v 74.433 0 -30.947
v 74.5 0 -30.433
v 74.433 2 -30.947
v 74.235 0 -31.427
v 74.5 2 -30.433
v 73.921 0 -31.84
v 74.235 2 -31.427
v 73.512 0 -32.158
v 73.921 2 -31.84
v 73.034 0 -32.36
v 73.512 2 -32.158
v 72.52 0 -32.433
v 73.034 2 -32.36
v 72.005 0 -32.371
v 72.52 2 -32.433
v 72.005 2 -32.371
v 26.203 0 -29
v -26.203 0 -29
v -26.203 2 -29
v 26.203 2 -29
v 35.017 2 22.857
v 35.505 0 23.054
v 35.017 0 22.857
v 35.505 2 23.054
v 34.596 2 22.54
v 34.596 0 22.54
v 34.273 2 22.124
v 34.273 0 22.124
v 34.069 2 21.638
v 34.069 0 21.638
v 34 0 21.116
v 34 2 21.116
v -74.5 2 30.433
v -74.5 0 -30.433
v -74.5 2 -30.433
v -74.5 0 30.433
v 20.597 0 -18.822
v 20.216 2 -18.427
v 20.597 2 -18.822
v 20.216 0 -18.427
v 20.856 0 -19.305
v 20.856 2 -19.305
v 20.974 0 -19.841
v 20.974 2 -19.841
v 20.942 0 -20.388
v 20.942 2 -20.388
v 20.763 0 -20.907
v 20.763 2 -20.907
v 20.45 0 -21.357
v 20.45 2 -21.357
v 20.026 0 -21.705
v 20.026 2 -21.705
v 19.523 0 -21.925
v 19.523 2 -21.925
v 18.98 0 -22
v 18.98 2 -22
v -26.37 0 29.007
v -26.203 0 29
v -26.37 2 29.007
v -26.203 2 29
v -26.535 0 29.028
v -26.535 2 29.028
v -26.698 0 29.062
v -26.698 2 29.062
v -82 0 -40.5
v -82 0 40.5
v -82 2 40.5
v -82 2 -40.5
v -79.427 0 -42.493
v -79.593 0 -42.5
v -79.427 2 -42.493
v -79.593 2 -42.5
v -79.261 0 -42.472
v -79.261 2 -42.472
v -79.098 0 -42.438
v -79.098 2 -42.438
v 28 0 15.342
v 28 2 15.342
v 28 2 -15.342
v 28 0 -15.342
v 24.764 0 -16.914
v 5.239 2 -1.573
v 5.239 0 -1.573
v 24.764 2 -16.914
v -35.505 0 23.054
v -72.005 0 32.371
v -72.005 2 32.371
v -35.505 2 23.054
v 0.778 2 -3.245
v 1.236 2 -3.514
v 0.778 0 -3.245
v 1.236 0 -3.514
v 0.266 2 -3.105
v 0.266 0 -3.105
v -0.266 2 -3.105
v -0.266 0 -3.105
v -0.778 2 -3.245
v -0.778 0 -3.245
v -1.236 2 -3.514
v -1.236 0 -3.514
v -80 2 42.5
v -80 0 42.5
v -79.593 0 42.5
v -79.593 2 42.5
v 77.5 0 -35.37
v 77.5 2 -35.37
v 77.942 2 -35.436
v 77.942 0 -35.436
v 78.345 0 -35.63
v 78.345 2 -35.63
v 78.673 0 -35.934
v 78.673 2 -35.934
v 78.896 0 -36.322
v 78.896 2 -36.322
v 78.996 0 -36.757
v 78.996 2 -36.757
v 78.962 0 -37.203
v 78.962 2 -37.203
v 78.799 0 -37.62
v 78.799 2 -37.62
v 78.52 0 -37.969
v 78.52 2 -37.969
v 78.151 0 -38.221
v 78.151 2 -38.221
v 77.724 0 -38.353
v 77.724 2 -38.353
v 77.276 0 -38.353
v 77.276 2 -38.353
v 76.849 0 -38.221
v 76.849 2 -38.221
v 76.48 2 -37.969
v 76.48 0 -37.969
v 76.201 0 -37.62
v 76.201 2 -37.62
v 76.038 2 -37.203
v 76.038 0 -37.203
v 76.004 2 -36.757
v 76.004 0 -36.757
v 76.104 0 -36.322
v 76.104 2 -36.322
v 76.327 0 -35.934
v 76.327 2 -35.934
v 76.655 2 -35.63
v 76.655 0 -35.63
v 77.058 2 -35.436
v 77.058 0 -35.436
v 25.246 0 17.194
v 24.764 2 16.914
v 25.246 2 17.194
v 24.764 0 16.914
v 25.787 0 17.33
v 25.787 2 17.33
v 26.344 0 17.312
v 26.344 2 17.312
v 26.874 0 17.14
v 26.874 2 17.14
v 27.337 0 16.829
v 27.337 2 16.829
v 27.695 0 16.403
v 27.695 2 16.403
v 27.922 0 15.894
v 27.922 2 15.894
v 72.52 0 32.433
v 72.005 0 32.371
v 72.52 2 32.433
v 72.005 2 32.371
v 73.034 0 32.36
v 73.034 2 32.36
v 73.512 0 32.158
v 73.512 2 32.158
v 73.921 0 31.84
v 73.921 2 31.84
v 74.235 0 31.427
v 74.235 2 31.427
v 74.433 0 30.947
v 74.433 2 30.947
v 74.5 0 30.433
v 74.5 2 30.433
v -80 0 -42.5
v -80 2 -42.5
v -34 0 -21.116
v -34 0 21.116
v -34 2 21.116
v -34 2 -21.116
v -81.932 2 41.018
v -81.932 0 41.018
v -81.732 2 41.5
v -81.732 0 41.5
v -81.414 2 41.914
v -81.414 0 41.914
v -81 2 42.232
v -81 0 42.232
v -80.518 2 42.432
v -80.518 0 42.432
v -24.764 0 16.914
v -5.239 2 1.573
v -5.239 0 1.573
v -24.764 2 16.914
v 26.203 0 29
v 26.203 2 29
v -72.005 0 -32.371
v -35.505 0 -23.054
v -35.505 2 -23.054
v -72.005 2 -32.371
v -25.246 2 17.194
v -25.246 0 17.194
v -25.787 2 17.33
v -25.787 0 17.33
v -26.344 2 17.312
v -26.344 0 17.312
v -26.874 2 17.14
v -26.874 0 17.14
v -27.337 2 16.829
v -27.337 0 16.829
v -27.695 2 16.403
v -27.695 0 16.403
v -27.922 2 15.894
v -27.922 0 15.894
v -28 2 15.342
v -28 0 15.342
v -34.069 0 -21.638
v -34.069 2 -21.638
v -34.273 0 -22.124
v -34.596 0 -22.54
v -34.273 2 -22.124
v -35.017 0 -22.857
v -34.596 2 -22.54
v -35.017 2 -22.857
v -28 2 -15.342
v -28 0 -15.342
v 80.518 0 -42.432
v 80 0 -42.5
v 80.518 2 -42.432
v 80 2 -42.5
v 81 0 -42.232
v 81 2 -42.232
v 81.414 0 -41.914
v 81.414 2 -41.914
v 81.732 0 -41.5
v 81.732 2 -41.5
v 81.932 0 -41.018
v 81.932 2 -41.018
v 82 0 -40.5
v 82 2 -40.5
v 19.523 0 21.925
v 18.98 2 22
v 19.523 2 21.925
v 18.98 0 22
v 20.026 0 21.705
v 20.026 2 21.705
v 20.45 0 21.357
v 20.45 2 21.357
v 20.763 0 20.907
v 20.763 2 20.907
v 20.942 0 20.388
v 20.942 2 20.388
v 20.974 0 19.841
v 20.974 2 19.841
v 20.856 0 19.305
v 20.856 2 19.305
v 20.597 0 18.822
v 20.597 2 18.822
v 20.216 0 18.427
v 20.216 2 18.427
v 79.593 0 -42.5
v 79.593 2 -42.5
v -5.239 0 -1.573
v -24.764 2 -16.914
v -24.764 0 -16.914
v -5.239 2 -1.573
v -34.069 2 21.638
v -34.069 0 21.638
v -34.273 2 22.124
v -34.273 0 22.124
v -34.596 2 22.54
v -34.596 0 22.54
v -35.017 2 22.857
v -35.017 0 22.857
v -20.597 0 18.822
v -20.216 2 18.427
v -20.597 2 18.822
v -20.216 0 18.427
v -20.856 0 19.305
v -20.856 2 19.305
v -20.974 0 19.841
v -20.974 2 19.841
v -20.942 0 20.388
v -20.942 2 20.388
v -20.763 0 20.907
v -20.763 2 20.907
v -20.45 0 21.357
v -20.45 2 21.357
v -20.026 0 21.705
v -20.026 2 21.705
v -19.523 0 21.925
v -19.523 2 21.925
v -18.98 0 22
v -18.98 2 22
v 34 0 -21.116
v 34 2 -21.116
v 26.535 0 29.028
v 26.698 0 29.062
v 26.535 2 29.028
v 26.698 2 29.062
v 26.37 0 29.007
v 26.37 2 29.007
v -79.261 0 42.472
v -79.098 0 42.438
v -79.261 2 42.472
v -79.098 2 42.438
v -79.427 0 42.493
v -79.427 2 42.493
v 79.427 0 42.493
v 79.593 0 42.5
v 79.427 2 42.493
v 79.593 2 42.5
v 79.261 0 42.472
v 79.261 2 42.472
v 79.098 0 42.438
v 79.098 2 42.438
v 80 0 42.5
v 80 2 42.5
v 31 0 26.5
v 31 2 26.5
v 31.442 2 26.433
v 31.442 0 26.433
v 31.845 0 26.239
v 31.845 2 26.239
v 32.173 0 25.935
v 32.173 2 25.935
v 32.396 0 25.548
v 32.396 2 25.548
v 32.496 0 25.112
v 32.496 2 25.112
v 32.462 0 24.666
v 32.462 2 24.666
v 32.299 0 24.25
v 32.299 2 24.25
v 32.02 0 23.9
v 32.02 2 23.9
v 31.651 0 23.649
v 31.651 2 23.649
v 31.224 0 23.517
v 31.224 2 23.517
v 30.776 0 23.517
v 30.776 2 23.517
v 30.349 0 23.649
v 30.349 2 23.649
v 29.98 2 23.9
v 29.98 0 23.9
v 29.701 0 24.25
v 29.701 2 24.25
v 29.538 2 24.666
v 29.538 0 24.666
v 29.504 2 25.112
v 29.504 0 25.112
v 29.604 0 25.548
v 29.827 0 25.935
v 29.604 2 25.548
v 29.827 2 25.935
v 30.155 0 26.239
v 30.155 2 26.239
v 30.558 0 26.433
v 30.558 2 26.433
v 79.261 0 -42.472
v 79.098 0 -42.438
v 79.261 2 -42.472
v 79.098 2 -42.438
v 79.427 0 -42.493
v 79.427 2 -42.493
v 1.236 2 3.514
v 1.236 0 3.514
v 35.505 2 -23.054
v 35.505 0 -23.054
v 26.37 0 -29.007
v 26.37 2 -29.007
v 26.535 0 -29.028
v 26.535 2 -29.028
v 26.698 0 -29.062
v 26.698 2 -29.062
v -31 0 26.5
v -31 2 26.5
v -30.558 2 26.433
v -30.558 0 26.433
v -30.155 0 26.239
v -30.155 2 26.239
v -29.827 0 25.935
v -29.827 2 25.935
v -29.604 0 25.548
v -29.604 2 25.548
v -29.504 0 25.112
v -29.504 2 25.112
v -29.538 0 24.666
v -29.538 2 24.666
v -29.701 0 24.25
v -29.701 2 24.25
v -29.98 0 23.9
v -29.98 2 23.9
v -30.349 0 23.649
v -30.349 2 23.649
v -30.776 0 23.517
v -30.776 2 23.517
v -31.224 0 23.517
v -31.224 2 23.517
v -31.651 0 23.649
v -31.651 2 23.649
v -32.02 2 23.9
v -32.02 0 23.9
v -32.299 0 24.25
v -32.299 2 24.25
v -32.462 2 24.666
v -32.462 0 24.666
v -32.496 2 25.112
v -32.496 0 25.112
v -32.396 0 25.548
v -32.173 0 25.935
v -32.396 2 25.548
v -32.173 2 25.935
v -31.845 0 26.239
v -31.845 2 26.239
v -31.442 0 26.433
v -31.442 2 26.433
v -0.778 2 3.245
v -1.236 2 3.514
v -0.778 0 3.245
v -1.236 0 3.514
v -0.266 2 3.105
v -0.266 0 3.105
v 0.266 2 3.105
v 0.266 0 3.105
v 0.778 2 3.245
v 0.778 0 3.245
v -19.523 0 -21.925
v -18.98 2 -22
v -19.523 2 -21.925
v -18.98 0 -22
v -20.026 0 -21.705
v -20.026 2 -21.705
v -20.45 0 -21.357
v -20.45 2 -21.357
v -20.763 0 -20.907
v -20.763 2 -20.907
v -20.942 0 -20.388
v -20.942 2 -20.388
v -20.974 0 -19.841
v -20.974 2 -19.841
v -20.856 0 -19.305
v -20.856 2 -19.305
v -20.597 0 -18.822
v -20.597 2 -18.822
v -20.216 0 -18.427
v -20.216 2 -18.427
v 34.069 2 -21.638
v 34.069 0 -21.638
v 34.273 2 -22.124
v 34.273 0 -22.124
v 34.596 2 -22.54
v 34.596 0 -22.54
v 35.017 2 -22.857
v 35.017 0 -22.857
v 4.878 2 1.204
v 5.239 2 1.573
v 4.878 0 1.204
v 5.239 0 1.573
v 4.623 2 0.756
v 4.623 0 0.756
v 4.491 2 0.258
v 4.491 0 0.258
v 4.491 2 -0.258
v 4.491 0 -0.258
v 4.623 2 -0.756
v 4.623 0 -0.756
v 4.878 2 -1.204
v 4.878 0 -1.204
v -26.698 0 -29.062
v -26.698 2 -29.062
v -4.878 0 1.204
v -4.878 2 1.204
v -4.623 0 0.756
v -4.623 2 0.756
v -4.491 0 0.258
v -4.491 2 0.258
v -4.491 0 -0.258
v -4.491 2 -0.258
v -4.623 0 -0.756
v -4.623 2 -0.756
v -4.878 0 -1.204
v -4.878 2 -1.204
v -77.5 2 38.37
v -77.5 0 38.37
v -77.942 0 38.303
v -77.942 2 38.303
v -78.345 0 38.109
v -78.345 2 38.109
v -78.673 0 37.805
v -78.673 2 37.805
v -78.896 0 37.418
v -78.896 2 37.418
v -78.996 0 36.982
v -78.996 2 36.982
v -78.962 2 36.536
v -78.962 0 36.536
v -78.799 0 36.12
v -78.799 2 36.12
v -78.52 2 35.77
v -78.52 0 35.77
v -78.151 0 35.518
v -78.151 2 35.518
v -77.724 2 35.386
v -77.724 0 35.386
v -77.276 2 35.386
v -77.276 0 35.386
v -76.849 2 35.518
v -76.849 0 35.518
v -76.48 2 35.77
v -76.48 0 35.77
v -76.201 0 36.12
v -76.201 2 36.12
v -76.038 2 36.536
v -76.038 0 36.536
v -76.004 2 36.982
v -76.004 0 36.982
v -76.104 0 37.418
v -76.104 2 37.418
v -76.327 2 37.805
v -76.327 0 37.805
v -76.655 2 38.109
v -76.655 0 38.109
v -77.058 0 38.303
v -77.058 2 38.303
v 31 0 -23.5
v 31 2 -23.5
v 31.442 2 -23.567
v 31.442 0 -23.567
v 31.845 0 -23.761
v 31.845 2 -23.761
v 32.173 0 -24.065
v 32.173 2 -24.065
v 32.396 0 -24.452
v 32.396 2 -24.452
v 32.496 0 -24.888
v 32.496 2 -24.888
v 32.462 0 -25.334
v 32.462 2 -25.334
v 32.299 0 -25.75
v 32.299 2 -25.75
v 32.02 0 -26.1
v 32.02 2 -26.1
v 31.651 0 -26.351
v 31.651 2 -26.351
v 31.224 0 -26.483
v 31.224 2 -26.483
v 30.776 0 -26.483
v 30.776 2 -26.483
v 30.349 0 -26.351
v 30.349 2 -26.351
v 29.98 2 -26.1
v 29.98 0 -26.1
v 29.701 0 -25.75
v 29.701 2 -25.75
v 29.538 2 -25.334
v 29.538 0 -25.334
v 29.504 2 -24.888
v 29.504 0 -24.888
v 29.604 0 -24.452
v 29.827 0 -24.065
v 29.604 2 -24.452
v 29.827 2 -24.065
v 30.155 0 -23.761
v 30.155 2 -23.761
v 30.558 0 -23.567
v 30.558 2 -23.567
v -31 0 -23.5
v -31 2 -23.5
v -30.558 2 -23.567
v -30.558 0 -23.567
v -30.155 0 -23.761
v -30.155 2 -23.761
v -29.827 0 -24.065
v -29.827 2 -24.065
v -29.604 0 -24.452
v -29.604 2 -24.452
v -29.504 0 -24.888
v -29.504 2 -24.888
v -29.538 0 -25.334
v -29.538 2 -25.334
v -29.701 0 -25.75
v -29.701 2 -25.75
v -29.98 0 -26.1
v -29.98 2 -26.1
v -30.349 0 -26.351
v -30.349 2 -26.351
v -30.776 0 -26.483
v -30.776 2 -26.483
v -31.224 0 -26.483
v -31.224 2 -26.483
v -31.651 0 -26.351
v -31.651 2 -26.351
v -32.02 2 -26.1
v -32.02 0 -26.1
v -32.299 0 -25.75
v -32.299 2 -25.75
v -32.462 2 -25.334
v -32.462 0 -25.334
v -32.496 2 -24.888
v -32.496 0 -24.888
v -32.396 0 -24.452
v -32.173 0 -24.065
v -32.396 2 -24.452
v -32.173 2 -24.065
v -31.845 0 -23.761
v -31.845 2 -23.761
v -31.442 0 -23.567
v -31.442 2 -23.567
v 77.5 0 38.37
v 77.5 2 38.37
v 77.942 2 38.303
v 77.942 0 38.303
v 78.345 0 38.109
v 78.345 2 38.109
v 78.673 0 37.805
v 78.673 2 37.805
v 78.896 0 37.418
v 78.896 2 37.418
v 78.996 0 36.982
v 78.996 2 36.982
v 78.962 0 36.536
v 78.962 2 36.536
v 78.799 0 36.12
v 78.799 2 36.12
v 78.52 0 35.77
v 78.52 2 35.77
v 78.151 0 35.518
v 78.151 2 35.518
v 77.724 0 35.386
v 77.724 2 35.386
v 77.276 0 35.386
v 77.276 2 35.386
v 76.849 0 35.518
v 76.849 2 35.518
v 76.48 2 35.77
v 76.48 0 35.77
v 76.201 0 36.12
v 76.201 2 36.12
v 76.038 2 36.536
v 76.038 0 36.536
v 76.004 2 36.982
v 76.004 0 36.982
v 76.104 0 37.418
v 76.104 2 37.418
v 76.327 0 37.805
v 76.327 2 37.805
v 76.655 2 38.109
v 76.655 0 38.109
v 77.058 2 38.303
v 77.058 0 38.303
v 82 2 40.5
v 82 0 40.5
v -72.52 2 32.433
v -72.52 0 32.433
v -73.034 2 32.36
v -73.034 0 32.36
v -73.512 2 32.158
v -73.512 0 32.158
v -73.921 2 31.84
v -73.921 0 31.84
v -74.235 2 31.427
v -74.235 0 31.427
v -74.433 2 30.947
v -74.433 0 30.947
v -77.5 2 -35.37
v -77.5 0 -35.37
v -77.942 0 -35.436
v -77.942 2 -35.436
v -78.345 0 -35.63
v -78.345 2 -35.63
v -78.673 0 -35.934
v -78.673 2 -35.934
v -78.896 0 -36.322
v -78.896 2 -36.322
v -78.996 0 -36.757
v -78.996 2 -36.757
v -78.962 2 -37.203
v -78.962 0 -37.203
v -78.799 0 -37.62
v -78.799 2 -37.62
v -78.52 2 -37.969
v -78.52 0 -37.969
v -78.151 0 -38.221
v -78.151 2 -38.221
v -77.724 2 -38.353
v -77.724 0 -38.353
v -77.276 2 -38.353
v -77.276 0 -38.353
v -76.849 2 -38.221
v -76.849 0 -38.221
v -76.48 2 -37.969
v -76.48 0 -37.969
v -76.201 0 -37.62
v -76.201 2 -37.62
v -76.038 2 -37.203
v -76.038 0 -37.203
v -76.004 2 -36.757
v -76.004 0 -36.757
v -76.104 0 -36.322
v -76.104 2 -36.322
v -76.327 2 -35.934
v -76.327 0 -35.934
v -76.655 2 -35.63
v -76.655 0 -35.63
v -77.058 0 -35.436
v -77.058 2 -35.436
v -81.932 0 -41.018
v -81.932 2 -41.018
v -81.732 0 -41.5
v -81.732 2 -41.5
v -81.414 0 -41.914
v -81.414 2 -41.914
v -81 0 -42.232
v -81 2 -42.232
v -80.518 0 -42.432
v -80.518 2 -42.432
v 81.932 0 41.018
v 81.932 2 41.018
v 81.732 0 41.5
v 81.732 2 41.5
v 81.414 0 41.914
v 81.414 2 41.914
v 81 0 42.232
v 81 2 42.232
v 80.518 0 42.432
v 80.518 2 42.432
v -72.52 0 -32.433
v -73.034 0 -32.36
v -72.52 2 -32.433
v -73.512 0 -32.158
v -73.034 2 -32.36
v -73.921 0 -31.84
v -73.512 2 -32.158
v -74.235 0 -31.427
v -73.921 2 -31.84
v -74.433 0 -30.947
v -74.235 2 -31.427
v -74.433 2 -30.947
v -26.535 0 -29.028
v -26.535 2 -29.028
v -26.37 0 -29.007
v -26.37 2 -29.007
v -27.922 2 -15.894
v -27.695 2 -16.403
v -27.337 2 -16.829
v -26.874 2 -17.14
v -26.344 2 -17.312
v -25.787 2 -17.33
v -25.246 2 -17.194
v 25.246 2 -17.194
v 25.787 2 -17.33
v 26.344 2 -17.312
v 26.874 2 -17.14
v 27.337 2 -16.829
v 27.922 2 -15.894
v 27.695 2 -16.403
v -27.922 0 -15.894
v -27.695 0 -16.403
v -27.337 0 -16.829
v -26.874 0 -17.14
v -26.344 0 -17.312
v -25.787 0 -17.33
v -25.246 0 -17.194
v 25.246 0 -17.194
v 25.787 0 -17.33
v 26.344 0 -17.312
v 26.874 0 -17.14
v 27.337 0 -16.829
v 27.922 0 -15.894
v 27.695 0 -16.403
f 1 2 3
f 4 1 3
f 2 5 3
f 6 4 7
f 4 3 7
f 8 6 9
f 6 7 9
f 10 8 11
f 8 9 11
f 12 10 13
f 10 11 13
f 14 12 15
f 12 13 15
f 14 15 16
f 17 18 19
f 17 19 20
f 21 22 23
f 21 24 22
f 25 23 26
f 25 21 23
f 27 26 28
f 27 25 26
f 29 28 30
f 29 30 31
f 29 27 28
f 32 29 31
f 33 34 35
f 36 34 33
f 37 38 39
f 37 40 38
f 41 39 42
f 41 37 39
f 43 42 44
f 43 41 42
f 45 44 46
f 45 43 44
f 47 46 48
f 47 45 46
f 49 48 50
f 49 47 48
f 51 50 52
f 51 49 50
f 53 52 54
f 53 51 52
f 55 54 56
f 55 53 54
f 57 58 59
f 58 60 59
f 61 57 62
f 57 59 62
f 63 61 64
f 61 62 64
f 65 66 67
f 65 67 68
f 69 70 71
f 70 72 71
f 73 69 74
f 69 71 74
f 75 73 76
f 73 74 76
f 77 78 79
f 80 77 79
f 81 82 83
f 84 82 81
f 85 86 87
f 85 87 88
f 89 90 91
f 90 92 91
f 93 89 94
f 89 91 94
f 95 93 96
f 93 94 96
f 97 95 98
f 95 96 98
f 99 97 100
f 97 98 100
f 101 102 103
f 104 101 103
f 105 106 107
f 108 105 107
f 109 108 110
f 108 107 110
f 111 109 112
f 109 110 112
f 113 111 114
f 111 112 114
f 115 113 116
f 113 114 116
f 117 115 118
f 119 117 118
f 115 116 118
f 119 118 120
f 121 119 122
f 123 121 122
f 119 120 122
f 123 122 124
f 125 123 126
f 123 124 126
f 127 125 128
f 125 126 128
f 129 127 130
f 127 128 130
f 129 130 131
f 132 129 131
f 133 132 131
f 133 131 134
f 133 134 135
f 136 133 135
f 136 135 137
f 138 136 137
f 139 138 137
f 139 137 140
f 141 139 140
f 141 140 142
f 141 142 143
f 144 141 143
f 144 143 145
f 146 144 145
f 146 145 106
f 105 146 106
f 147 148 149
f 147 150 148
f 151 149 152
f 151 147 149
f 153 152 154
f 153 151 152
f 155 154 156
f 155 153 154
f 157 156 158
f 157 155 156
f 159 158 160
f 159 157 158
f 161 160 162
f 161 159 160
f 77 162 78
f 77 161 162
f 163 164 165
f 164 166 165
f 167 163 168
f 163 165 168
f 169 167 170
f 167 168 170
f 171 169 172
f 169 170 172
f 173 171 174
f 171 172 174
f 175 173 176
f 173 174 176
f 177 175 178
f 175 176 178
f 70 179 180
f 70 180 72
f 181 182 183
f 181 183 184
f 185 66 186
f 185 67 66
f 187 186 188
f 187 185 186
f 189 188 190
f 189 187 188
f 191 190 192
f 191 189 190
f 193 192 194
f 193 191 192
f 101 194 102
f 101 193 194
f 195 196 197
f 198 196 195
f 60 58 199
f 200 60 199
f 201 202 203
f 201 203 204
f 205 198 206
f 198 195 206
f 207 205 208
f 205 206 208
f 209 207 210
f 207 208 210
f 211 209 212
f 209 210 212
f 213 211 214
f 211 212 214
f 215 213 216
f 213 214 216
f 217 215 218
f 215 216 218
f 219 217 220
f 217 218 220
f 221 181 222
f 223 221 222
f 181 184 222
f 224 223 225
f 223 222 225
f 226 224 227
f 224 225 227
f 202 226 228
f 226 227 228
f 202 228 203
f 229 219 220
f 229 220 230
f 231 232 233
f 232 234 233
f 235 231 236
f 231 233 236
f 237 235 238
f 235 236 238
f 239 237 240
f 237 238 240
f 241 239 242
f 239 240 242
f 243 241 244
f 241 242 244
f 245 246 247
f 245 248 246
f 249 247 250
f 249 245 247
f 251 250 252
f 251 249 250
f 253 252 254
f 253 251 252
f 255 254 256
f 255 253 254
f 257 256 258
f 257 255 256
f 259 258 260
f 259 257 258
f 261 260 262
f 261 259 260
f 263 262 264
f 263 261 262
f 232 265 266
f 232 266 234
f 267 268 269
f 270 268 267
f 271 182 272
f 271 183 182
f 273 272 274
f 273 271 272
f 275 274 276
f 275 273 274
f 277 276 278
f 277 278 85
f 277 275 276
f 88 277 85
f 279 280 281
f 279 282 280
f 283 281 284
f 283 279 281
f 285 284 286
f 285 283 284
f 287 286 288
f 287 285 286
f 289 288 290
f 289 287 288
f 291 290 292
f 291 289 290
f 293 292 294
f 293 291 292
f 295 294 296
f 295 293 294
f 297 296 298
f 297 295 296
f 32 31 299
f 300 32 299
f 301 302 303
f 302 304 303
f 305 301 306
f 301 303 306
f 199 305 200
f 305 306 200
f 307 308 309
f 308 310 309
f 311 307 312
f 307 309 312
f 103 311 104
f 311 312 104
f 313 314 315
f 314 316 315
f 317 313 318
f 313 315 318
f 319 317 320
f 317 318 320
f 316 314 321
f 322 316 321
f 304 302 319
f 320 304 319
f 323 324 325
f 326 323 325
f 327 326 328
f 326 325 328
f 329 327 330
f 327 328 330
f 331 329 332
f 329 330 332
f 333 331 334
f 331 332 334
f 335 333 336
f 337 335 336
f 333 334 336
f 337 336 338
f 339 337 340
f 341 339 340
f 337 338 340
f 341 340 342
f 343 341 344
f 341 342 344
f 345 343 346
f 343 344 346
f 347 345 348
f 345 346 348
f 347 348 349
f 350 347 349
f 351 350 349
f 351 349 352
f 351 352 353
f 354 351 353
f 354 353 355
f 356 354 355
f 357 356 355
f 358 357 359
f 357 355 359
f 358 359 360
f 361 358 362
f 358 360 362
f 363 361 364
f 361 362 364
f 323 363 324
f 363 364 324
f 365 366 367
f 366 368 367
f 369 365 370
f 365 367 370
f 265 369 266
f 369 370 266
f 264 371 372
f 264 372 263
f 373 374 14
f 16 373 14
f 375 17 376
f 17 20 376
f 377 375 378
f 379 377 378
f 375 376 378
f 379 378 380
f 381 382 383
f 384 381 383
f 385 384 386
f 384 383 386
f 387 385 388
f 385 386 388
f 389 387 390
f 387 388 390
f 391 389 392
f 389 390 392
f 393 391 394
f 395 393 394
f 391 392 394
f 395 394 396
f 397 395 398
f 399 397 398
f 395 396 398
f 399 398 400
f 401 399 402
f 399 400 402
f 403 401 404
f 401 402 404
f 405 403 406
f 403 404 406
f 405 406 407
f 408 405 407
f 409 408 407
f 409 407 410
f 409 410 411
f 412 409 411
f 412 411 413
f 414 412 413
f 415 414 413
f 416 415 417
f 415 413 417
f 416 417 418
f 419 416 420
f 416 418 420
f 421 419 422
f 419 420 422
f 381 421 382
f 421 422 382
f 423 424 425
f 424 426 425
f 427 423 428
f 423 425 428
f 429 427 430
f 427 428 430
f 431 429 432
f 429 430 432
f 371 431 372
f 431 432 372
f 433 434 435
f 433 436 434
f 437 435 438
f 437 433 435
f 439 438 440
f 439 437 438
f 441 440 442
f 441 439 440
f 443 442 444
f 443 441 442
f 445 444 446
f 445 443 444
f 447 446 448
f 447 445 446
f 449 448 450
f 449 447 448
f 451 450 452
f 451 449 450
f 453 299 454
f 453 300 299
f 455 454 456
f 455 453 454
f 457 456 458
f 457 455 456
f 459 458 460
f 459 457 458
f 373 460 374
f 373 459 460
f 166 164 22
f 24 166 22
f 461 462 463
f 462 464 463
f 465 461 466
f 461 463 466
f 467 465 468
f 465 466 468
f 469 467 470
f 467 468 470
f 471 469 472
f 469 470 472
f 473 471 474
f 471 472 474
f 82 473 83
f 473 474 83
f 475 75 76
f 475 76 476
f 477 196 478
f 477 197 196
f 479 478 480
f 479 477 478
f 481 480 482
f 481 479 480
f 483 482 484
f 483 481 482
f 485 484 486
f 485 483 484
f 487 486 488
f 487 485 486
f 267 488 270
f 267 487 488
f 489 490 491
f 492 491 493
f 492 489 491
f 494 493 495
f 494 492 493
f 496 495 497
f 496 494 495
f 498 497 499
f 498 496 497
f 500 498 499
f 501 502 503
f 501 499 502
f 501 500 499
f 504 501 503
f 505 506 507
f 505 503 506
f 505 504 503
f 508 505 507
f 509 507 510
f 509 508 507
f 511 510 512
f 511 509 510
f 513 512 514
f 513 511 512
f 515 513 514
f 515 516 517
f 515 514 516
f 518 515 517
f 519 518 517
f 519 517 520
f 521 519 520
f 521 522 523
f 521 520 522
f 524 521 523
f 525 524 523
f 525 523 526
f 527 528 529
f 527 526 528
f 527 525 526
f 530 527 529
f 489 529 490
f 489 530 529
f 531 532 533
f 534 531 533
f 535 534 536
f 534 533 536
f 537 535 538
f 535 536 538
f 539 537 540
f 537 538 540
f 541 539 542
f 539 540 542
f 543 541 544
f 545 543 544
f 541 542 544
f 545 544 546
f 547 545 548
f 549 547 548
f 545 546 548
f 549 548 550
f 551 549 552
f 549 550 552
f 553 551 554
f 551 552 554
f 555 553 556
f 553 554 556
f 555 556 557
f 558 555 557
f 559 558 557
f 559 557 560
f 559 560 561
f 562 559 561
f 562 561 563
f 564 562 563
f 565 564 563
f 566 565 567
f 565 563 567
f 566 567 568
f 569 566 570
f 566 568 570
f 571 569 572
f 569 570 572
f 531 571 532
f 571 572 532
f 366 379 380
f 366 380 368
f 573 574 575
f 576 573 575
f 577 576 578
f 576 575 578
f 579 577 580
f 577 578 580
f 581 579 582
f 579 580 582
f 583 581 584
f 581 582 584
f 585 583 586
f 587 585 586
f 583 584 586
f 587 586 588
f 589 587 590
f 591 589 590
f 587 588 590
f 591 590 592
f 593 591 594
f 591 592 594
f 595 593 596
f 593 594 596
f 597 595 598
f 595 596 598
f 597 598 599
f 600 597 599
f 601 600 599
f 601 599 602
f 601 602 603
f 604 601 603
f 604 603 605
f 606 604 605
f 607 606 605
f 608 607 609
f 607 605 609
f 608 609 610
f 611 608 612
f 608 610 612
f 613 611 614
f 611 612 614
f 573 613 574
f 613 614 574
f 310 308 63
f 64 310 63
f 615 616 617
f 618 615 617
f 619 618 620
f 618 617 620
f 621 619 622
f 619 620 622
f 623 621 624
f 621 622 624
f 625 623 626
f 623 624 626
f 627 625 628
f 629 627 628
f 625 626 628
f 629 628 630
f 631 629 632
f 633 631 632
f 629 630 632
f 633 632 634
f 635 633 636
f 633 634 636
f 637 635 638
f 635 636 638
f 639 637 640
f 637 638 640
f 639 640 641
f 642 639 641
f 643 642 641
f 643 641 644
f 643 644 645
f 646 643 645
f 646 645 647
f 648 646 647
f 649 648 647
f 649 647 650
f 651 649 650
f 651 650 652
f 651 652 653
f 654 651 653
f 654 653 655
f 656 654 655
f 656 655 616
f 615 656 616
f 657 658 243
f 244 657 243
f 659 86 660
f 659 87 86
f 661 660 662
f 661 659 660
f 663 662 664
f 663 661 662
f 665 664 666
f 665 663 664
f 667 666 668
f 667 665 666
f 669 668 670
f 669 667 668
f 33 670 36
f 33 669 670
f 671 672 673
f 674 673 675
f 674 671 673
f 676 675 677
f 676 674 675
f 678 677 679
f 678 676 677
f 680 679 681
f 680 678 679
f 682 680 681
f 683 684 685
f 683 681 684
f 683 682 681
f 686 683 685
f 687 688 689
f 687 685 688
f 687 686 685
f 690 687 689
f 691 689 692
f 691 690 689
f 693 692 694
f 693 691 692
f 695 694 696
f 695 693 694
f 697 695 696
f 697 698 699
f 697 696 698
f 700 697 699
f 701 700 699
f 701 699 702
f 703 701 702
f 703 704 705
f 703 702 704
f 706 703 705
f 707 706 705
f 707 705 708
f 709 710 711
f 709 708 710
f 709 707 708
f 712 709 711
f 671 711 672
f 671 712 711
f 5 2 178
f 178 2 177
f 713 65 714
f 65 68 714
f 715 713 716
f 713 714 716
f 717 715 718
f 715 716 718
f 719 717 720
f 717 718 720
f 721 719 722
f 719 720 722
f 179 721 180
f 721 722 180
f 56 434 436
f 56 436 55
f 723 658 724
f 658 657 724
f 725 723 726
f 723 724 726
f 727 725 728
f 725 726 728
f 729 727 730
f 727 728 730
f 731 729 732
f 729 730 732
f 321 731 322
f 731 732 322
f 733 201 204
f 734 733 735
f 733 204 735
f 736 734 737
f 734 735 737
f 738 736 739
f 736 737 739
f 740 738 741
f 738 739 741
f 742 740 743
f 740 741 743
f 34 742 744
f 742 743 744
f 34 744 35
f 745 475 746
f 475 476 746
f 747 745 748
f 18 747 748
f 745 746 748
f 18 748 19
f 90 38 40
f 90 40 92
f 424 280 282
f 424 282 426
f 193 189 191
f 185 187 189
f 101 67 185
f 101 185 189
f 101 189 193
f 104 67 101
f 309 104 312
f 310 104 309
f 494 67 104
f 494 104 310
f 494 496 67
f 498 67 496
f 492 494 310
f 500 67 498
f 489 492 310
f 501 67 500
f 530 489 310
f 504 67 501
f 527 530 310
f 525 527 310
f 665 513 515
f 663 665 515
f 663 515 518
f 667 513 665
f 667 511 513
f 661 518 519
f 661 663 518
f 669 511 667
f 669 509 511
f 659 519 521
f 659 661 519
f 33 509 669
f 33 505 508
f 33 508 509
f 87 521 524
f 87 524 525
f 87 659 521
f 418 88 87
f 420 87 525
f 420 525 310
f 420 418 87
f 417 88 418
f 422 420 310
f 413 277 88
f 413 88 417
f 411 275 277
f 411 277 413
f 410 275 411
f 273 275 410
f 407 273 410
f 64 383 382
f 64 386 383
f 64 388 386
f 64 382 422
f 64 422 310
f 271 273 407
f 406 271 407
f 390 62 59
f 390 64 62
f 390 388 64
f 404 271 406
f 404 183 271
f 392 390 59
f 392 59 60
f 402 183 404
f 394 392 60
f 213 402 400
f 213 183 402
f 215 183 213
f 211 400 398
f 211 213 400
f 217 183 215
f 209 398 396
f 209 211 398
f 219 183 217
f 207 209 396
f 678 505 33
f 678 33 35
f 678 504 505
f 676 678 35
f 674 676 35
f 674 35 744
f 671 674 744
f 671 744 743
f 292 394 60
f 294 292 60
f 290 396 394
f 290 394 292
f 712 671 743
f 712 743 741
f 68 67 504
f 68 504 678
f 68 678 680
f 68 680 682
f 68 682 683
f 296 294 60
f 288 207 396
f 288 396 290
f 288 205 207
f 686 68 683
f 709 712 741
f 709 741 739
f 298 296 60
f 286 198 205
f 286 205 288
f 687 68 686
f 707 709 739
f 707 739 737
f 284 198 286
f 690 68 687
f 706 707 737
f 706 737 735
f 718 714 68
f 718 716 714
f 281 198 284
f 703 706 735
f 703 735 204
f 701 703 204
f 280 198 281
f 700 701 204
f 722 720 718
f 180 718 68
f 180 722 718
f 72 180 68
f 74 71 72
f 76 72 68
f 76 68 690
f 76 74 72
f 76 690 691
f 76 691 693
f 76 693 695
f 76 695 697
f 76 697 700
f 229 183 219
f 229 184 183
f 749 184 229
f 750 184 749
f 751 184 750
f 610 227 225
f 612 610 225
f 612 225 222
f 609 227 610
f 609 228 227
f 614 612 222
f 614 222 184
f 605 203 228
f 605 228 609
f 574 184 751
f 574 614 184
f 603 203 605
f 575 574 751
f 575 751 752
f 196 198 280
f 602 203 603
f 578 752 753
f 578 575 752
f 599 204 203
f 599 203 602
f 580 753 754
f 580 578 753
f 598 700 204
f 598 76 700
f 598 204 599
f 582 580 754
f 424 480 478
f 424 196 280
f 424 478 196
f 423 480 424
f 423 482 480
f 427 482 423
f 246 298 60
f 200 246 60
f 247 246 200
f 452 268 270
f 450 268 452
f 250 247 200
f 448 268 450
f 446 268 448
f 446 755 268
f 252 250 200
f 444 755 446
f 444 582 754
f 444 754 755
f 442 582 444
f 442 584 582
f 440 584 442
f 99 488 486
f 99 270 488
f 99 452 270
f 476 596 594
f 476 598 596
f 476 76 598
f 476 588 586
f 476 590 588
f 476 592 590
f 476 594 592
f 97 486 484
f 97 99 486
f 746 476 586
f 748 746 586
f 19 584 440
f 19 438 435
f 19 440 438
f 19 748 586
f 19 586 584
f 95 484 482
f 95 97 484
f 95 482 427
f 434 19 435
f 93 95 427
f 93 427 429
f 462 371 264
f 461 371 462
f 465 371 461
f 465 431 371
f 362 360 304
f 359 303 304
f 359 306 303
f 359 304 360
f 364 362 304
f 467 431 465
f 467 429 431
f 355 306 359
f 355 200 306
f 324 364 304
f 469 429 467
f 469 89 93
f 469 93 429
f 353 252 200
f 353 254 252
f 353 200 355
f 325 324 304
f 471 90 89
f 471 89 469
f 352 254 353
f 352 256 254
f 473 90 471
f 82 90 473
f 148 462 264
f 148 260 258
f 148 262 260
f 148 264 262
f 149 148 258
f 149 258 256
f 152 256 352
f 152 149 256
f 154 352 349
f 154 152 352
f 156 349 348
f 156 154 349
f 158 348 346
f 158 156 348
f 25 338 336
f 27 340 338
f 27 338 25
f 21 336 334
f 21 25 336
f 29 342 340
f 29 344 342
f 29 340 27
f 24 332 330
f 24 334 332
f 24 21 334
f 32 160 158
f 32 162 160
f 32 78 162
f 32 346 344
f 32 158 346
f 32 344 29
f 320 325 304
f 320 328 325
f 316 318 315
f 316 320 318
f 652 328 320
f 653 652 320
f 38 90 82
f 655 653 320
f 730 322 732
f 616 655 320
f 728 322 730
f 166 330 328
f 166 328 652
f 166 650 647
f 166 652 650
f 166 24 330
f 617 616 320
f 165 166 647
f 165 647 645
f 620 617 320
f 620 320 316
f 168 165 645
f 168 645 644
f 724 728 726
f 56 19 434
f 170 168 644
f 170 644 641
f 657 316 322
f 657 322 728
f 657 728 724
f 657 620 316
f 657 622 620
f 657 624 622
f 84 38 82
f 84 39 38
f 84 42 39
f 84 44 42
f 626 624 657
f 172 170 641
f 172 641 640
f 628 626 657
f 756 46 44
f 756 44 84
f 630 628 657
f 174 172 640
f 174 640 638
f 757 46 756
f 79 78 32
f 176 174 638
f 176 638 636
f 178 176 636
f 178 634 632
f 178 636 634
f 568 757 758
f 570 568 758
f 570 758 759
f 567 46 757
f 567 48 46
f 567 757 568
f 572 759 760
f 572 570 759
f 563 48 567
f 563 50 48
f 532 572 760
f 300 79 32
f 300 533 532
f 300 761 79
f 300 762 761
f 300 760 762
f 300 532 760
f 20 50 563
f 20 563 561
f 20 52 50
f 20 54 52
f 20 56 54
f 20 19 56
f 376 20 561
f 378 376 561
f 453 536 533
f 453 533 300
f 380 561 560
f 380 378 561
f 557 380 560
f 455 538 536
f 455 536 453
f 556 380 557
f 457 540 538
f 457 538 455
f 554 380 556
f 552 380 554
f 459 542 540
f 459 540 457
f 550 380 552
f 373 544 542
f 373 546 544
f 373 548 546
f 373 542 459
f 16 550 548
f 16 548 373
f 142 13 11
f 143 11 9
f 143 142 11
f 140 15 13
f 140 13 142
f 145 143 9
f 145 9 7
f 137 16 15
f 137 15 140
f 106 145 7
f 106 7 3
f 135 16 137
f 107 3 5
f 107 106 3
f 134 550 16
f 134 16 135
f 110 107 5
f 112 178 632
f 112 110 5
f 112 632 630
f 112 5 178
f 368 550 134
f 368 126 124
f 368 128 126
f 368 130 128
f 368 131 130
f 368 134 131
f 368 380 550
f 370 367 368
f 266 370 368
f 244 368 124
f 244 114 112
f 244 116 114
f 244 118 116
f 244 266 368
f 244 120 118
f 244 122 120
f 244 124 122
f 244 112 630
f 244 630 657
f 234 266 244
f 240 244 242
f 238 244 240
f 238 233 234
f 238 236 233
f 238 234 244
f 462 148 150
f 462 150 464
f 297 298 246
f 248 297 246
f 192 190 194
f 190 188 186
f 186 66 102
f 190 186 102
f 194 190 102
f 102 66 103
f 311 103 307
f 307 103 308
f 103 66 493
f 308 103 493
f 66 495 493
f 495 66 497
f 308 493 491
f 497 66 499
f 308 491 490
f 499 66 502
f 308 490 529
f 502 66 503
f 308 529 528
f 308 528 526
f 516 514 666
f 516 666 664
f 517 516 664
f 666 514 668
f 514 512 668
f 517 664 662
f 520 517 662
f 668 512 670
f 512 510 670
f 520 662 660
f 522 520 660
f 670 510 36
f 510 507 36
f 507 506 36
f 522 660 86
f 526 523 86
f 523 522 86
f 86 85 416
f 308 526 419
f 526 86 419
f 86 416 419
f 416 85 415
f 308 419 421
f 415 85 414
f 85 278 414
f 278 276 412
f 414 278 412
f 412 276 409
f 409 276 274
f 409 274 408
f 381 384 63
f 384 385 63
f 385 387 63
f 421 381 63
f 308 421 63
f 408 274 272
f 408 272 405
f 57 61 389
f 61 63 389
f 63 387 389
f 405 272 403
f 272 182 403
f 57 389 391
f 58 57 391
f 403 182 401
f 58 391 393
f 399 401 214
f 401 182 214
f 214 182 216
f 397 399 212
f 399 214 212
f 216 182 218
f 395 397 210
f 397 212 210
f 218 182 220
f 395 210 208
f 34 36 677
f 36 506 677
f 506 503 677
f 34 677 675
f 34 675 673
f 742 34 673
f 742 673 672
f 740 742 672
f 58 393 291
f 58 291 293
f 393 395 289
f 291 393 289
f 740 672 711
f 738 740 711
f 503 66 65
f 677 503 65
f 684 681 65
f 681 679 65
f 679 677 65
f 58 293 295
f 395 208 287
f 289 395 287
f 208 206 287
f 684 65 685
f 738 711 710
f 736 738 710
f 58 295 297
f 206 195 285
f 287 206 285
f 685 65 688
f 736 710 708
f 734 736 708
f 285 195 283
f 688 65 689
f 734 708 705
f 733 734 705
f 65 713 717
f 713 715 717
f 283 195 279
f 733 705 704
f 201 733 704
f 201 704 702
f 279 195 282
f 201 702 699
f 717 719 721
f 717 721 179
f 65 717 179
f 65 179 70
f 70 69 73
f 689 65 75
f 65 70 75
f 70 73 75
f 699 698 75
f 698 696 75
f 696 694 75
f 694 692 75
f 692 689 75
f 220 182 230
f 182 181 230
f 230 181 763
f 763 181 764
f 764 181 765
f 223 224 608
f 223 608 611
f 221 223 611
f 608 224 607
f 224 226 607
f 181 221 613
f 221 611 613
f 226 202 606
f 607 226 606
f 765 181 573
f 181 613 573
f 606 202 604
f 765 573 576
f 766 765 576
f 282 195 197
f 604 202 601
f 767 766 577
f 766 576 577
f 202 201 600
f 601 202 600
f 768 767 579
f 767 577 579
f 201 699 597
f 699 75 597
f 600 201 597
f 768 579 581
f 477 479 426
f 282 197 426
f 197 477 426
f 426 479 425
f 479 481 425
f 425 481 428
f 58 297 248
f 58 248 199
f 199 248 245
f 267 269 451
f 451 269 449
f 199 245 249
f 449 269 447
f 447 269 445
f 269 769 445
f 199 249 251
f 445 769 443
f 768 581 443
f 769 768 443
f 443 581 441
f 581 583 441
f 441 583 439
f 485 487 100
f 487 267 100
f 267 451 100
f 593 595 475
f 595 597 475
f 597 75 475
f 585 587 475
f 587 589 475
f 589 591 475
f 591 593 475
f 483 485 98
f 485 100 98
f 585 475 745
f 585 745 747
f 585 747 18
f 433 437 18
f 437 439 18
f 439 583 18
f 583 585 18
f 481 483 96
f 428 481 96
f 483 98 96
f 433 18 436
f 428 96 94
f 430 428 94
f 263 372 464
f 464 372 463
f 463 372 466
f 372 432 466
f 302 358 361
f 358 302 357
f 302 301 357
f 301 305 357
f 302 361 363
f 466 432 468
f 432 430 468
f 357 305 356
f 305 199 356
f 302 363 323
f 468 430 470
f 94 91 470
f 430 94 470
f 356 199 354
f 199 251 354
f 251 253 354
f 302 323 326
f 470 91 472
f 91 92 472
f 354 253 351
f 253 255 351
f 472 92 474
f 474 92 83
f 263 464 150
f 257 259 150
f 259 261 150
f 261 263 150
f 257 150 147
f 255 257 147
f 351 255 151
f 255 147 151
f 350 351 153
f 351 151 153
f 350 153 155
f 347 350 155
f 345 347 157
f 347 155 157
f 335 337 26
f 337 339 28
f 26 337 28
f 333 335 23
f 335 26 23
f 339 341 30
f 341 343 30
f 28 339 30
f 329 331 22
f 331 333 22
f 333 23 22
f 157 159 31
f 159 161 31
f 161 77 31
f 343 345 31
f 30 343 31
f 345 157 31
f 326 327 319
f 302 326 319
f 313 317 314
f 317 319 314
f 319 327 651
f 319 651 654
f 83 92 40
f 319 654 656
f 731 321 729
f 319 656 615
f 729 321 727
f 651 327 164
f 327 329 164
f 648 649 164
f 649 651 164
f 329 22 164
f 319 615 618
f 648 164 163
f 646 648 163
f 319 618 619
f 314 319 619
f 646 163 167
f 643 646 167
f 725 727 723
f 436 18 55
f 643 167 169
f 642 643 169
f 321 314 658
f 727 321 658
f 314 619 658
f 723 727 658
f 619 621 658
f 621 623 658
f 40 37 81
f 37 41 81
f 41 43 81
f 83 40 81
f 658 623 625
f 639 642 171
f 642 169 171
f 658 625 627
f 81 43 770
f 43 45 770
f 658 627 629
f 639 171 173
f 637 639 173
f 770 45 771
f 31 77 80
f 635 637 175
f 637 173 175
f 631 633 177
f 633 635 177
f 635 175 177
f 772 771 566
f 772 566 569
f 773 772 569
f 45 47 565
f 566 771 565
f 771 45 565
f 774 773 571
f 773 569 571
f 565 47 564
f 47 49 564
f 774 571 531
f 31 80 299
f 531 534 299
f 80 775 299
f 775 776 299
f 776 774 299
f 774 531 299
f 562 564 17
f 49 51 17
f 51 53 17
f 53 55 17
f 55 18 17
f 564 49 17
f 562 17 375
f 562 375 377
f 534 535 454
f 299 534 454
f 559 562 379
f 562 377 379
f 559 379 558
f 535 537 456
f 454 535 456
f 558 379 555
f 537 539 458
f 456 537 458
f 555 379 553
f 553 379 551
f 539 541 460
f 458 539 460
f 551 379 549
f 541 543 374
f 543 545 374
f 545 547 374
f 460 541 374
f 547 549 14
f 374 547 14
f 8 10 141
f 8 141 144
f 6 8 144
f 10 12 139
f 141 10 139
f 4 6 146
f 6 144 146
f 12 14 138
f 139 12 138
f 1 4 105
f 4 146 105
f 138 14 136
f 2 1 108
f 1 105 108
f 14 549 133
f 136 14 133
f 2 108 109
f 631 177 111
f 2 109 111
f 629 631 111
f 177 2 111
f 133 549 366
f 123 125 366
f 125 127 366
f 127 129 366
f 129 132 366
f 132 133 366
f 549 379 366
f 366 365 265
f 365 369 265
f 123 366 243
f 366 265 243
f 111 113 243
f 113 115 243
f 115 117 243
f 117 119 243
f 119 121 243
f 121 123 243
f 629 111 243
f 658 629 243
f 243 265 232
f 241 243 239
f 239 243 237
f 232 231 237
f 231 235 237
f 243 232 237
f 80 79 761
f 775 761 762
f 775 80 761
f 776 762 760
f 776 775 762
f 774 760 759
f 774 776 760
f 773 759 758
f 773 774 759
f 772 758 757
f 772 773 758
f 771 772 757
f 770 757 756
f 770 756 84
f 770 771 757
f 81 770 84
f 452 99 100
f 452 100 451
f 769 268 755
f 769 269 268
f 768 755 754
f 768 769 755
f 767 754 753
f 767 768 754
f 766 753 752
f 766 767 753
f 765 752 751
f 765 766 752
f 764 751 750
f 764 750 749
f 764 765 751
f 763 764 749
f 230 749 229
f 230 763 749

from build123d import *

# Parameters (mm, degrees)
SKETCH_1_W          = 164
SKETCH_1_H          = 85
EXTRUDE_1_DEPTH     = 2
SKETCH_2_R          = 1.5
CUT_EXTRUDE_1_DEPTH = 2
SKETCH_4_W          = 56
SKETCH_4_H          = 44
CUT_EXTRUDE_3_DEPTH = 10
EXTRUDE_2_DEPTH     = 2
SKETCH_9_R          = 1.5
CUT_EXTRUDE_6_DEPTH = 10
CUT_EXTRUDE_7_DEPTH = 10
CUT_EXTRUDE_8_DEPTH = 10
FILLET_3_R          = 2
FILLET_4_R          = 2


with BuildPart() as part:
    # 草图1 → 凸台-拉伸1 (new body)
    with BuildSketch(Plane(origin=(0, 0, 0), x_dir=(1, 0, 0), z_dir=(0, 1, 0))):
        Rectangle(SKETCH_1_W, SKETCH_1_H)
    extrude(amount=EXTRUDE_1_DEPTH)

    # 草图2 → 切除-拉伸1 (cut)
    with BuildSketch(Plane(origin=(0, 2, 0), x_dir=(1, 0, 0), z_dir=(0, 1, 0))):
        with Locations(Location((31, 25, 0), (0, 0, 270))):
            Circle(SKETCH_2_R)
        with Locations(Location((-31, 25, 0), (0, 0, 270))):
            Circle(SKETCH_2_R)
        with Locations(Location((-31, -25, 0), (0, 0, 270))):
            Circle(SKETCH_2_R)
        with Locations(Location((31, -25, 0), (0, 0, 270))):
            Circle(SKETCH_2_R)
    extrude(amount=-CUT_EXTRUDE_1_DEPTH, mode=Mode.SUBTRACT)

    # 草图4 → 切除-拉伸3 (cut)
    with BuildSketch(Plane(origin=(0, 2, 0), x_dir=(1, 0, 0), z_dir=(0, 1, 0))):
        Rectangle(SKETCH_4_W, SKETCH_4_H)
    extrude(amount=-CUT_EXTRUDE_3_DEPTH, mode=Mode.SUBTRACT)

    # 草图7 → 凸台-拉伸2 (add)
    with BuildSketch(Plane(origin=(0, 2, 0), x_dir=(1, 0, 0), z_dir=(0, 1, 0))):
        Polygon((0, -2.543499116), (-3.237180694, 0), (-28, -19.456500884), (-28, -22), (-24.762819306, -22), align=None)
        Polygon((0, 2.543499116), (-3.237180694, 0), (0, -2.543499116), (3.237180694, 0), align=None)
        Polygon((24.762819306, 22), (0, 2.543499116), (3.237180694, 0), (28, 19.456500884), (28, 22), align=None)
        Polygon((3.237180694, 0), (0, -2.543499116), (24.762819306, -22), (28, -22), (28, -19.456500884), align=None)
        Polygon((-28, 22), (-28, 19.456500884), (-3.237180694, 0), (0, 2.543499116), (-24.762819306, 22), align=None)
    extrude(amount=-EXTRUDE_2_DEPTH)

    # 草图9 → 切除-拉伸6 (cut)
    with BuildSketch(Plane(origin=(0, 2, 0), x_dir=(1, 0, 0), z_dir=(0, 1, 0))):
        with Locations(Location((77.5, -36.869534675, 0), (0, 0, 270))):
            Circle(SKETCH_9_R)
        with Locations(Location((77.5, 36.869534675, 0), (0, 0, 270))):
            Circle(SKETCH_9_R)
    cut_extrude_6 = extrude(amount=-CUT_EXTRUDE_6_DEPTH, mode=Mode.SUBTRACT)

    # 镜向3: 切除-拉伸6 across plane
    add(cut_extrude_6.mirror(Plane(origin=(0, 0, 0), x_dir=(0, 0, 1), z_dir=(1, 0, 0))), mode=Mode.SUBTRACT)

    # 草图11 → 切除-拉伸7 (cut)
    with BuildSketch(Plane.XZ):
        Polygon((-74.5, 33.007564849), (-34, 22.669583035), (-34, -22.669583035), (-74.5, -33.007564849), align=None)
    cut_extrude_7 = extrude(amount=-CUT_EXTRUDE_7_DEPTH, mode=Mode.SUBTRACT)

    # 镜向4: 切除-拉伸7 across plane
    add(cut_extrude_7.mirror(Plane(origin=(0, 0, 0), x_dir=(0, 0, 1), z_dir=(1, 0, 0))), mode=Mode.SUBTRACT)

    # 草图12 → 切除-拉伸8 (cut)
    with BuildSketch(Plane.XZ):
        Polygon((-79.341828688, 42.5), (-26.454329961, 29), (26.454329961, 29), (79.341828688, 42.5), align=None)
    cut_extrude_8 = extrude(amount=-CUT_EXTRUDE_8_DEPTH, mode=Mode.SUBTRACT)

    # 镜向5: 切除-拉伸8 across plane
    add(cut_extrude_8.mirror(Plane.XY), mode=Mode.SUBTRACT)

    # 圆角3
    fillet_3_edges = [part.edges().sort_by_distance(p)[0] for p in [
        (-74.5, 1, -33.007564849),
        (-74.5, 1, 33.007564849),
        (-34, 1, 22.669583035),
        (-34, 1, -22.669583035),
        (74.5, 1, 33.007564849),
        (74.5, 1, -33.007564849),
        (34, 1, -22.669583035),
        (34, 1, 22.669583035),
        (-28, 1, 19.456500884),
        (-3.237180694, 1, 0),
        (-28, 1, -19.456500884),
        (-24.762819306, 1, -22),
        (0, 1, -2.543499116),
        (24.762819306, 1, -22),
        (28, 1, -19.456500884),
        (3.237180694, 1, 0),
        (28, 1, 19.456500884),
        (24.762819306, 1, 22),
        (0, 1, 2.543499116),
        (-24.762819306, 1, 22),
    ]]
    fillet(fillet_3_edges, radius=FILLET_3_R)

    # 圆角4
    fillet_4_edges = [part.edges().sort_by_distance(p)[0] for p in [
        (-79.341828688, 1, 42.5),
        (79.341828688, 1, 42.5),
        (26.454329961, 1, 29),
        (-26.454329961, 1, 29),
        (79.341828688, 1, -42.5),
        (-79.341828688, 1, -42.5),
        (-26.454329961, 1, -29),
        (26.454329961, 1, -29),
        (82, 1, 42.5),
        (-82, 1, 42.5),
        (-82, 1, -42.5),
        (82, 1, -42.5),
    ]]
    fillet(fillet_4_edges, radius=FILLET_4_R)


solid = part.part
